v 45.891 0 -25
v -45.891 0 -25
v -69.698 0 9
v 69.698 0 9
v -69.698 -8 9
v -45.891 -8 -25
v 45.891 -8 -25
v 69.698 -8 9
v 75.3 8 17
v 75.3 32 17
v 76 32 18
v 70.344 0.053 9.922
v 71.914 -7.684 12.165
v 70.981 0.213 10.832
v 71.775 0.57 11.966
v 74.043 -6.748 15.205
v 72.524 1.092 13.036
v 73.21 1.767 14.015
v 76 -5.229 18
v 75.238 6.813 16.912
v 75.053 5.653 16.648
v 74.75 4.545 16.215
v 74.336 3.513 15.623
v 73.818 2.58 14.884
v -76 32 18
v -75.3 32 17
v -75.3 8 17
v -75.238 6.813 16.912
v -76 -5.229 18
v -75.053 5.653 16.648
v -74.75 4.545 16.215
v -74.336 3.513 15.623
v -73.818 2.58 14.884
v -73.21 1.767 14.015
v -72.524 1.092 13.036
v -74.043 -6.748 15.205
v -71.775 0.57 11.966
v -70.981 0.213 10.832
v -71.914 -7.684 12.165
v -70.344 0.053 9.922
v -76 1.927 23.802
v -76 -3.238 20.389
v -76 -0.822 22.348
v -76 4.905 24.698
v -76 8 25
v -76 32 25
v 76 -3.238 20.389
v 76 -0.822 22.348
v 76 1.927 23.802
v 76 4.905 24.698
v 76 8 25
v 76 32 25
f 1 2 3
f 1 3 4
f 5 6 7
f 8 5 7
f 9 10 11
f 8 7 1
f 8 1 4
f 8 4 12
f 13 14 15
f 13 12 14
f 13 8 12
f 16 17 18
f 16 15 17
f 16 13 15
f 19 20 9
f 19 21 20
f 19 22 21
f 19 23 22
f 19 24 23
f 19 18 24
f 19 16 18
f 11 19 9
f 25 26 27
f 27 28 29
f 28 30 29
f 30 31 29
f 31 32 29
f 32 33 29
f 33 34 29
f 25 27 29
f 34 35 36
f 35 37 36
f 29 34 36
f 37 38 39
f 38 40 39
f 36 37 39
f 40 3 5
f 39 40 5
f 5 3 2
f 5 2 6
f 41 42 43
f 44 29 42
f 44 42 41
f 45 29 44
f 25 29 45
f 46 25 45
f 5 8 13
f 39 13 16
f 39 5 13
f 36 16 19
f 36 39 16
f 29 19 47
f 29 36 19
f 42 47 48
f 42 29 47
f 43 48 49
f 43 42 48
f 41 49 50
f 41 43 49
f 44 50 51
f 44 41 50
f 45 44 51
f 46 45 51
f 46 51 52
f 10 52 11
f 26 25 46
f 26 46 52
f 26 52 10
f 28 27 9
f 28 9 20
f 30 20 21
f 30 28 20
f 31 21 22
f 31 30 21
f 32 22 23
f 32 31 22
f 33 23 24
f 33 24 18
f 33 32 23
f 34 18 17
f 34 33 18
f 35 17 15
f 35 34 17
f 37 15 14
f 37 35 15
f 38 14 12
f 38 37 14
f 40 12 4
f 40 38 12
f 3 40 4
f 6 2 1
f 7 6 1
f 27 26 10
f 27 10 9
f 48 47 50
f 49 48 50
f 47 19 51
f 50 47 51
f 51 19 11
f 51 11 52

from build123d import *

# Parameters (mm, degrees)
SKETCH1_W                    = 152
SKETCH1_H                    = 50
BASE_FLANGE1_DEPTH           = 8
EDGE_FLANGE1_STRIP_W         = 48
EDGE_FLANGE1_STRIP_H         = 8
EDGE_FLANGE1_STRIP_CUT_DEPTH = 152
EDGE_FLANGE1_DEPTH           = 152
CHAMFER1_SIZE                = 43
CHAMFER1_SIZE2               = 30.108924143
MIRROR3_START                = 51.931179512
MIRROR3_OUTLINE_W            = 56
MIRROR3_OUTLINE_H            = 41
MIRROR3_DEPTH                = 24.663786763


# Read off the part's stored shape, not the designer's step: Mirror3
# Sheet-metal steps are written as plain solids
with BuildPart() as part:
    # Sketch1 → Base-Flange1 (new body)
    with BuildSketch(Plane(origin=(0, 0, 0), x_dir=(1, 0, 0), z_dir=(0, 1, 0))):
        Rectangle(SKETCH1_W, SKETCH1_H)
    extrude(amount=-BASE_FLANGE1_DEPTH)

    # Edge-Flange1 strip (across the edge) → Edge-Flange1 strip cut (cut)
    with BuildSketch(Plane(origin=(-76, 0, 25), x_dir=(0, 0, -1), z_dir=(1, 0, 0))):
        with Locations((-8, -4)):
            Rectangle(EDGE_FLANGE1_STRIP_W, EDGE_FLANGE1_STRIP_H)
    extrude(amount=EDGE_FLANGE1_STRIP_CUT_DEPTH, mode=Mode.SUBTRACT)

    # Edge-Flange1 section (across the edge) → Edge-Flange1 (add)
    with BuildSketch(Plane(origin=(-76, 0, 25), x_dir=(0, 0, -1), z_dir=(1, 0, 0))):
        with BuildLine():
            Line((0, 8), (0, 32))
            Line((0, 32), (8, 32))
            Line((8, 32), (8, 8))
            ThreePointArc((8, 8), (10.343145751, 2.343145751), (16, 0))
            Line((16, 0), (16, -8))
            ThreePointArc((16, -8), (4.686291501, -3.313708499), (0, 8))
        make_face()
    extrude(amount=EDGE_FLANGE1_DEPTH)

    # Chamfer1
    chamfer1_edges = [part.edges().sort_by_distance(p)[0] for p in [
        (-76, -4, -25),
    ]]
    chamfer1_side = [part.faces().sort_by_distance(p)[0] for p in [
        (-76, -0.640312424, -8),
    ]]
    chamfer(chamfer1_edges, length=CHAMFER1_SIZE, length2=CHAMFER1_SIZE2, reference=chamfer1_side[0])

    # Mirror3 outline → Mirror3 (cut)
    with BuildSketch(Plane(origin=(0, 0, 0), x_dir=(0.5735764363510512, 0, 0.8191520442889882), z_dir=(0.8191520442889882, 0, -0.5735764363510512)).offset(MIRROR3_START)):
        with Locations((32, -12.5)):
            Rectangle(MIRROR3_OUTLINE_W, MIRROR3_OUTLINE_H)
    extrude(amount=MIRROR3_DEPTH, mode=Mode.SUBTRACT)


solid = part.part
